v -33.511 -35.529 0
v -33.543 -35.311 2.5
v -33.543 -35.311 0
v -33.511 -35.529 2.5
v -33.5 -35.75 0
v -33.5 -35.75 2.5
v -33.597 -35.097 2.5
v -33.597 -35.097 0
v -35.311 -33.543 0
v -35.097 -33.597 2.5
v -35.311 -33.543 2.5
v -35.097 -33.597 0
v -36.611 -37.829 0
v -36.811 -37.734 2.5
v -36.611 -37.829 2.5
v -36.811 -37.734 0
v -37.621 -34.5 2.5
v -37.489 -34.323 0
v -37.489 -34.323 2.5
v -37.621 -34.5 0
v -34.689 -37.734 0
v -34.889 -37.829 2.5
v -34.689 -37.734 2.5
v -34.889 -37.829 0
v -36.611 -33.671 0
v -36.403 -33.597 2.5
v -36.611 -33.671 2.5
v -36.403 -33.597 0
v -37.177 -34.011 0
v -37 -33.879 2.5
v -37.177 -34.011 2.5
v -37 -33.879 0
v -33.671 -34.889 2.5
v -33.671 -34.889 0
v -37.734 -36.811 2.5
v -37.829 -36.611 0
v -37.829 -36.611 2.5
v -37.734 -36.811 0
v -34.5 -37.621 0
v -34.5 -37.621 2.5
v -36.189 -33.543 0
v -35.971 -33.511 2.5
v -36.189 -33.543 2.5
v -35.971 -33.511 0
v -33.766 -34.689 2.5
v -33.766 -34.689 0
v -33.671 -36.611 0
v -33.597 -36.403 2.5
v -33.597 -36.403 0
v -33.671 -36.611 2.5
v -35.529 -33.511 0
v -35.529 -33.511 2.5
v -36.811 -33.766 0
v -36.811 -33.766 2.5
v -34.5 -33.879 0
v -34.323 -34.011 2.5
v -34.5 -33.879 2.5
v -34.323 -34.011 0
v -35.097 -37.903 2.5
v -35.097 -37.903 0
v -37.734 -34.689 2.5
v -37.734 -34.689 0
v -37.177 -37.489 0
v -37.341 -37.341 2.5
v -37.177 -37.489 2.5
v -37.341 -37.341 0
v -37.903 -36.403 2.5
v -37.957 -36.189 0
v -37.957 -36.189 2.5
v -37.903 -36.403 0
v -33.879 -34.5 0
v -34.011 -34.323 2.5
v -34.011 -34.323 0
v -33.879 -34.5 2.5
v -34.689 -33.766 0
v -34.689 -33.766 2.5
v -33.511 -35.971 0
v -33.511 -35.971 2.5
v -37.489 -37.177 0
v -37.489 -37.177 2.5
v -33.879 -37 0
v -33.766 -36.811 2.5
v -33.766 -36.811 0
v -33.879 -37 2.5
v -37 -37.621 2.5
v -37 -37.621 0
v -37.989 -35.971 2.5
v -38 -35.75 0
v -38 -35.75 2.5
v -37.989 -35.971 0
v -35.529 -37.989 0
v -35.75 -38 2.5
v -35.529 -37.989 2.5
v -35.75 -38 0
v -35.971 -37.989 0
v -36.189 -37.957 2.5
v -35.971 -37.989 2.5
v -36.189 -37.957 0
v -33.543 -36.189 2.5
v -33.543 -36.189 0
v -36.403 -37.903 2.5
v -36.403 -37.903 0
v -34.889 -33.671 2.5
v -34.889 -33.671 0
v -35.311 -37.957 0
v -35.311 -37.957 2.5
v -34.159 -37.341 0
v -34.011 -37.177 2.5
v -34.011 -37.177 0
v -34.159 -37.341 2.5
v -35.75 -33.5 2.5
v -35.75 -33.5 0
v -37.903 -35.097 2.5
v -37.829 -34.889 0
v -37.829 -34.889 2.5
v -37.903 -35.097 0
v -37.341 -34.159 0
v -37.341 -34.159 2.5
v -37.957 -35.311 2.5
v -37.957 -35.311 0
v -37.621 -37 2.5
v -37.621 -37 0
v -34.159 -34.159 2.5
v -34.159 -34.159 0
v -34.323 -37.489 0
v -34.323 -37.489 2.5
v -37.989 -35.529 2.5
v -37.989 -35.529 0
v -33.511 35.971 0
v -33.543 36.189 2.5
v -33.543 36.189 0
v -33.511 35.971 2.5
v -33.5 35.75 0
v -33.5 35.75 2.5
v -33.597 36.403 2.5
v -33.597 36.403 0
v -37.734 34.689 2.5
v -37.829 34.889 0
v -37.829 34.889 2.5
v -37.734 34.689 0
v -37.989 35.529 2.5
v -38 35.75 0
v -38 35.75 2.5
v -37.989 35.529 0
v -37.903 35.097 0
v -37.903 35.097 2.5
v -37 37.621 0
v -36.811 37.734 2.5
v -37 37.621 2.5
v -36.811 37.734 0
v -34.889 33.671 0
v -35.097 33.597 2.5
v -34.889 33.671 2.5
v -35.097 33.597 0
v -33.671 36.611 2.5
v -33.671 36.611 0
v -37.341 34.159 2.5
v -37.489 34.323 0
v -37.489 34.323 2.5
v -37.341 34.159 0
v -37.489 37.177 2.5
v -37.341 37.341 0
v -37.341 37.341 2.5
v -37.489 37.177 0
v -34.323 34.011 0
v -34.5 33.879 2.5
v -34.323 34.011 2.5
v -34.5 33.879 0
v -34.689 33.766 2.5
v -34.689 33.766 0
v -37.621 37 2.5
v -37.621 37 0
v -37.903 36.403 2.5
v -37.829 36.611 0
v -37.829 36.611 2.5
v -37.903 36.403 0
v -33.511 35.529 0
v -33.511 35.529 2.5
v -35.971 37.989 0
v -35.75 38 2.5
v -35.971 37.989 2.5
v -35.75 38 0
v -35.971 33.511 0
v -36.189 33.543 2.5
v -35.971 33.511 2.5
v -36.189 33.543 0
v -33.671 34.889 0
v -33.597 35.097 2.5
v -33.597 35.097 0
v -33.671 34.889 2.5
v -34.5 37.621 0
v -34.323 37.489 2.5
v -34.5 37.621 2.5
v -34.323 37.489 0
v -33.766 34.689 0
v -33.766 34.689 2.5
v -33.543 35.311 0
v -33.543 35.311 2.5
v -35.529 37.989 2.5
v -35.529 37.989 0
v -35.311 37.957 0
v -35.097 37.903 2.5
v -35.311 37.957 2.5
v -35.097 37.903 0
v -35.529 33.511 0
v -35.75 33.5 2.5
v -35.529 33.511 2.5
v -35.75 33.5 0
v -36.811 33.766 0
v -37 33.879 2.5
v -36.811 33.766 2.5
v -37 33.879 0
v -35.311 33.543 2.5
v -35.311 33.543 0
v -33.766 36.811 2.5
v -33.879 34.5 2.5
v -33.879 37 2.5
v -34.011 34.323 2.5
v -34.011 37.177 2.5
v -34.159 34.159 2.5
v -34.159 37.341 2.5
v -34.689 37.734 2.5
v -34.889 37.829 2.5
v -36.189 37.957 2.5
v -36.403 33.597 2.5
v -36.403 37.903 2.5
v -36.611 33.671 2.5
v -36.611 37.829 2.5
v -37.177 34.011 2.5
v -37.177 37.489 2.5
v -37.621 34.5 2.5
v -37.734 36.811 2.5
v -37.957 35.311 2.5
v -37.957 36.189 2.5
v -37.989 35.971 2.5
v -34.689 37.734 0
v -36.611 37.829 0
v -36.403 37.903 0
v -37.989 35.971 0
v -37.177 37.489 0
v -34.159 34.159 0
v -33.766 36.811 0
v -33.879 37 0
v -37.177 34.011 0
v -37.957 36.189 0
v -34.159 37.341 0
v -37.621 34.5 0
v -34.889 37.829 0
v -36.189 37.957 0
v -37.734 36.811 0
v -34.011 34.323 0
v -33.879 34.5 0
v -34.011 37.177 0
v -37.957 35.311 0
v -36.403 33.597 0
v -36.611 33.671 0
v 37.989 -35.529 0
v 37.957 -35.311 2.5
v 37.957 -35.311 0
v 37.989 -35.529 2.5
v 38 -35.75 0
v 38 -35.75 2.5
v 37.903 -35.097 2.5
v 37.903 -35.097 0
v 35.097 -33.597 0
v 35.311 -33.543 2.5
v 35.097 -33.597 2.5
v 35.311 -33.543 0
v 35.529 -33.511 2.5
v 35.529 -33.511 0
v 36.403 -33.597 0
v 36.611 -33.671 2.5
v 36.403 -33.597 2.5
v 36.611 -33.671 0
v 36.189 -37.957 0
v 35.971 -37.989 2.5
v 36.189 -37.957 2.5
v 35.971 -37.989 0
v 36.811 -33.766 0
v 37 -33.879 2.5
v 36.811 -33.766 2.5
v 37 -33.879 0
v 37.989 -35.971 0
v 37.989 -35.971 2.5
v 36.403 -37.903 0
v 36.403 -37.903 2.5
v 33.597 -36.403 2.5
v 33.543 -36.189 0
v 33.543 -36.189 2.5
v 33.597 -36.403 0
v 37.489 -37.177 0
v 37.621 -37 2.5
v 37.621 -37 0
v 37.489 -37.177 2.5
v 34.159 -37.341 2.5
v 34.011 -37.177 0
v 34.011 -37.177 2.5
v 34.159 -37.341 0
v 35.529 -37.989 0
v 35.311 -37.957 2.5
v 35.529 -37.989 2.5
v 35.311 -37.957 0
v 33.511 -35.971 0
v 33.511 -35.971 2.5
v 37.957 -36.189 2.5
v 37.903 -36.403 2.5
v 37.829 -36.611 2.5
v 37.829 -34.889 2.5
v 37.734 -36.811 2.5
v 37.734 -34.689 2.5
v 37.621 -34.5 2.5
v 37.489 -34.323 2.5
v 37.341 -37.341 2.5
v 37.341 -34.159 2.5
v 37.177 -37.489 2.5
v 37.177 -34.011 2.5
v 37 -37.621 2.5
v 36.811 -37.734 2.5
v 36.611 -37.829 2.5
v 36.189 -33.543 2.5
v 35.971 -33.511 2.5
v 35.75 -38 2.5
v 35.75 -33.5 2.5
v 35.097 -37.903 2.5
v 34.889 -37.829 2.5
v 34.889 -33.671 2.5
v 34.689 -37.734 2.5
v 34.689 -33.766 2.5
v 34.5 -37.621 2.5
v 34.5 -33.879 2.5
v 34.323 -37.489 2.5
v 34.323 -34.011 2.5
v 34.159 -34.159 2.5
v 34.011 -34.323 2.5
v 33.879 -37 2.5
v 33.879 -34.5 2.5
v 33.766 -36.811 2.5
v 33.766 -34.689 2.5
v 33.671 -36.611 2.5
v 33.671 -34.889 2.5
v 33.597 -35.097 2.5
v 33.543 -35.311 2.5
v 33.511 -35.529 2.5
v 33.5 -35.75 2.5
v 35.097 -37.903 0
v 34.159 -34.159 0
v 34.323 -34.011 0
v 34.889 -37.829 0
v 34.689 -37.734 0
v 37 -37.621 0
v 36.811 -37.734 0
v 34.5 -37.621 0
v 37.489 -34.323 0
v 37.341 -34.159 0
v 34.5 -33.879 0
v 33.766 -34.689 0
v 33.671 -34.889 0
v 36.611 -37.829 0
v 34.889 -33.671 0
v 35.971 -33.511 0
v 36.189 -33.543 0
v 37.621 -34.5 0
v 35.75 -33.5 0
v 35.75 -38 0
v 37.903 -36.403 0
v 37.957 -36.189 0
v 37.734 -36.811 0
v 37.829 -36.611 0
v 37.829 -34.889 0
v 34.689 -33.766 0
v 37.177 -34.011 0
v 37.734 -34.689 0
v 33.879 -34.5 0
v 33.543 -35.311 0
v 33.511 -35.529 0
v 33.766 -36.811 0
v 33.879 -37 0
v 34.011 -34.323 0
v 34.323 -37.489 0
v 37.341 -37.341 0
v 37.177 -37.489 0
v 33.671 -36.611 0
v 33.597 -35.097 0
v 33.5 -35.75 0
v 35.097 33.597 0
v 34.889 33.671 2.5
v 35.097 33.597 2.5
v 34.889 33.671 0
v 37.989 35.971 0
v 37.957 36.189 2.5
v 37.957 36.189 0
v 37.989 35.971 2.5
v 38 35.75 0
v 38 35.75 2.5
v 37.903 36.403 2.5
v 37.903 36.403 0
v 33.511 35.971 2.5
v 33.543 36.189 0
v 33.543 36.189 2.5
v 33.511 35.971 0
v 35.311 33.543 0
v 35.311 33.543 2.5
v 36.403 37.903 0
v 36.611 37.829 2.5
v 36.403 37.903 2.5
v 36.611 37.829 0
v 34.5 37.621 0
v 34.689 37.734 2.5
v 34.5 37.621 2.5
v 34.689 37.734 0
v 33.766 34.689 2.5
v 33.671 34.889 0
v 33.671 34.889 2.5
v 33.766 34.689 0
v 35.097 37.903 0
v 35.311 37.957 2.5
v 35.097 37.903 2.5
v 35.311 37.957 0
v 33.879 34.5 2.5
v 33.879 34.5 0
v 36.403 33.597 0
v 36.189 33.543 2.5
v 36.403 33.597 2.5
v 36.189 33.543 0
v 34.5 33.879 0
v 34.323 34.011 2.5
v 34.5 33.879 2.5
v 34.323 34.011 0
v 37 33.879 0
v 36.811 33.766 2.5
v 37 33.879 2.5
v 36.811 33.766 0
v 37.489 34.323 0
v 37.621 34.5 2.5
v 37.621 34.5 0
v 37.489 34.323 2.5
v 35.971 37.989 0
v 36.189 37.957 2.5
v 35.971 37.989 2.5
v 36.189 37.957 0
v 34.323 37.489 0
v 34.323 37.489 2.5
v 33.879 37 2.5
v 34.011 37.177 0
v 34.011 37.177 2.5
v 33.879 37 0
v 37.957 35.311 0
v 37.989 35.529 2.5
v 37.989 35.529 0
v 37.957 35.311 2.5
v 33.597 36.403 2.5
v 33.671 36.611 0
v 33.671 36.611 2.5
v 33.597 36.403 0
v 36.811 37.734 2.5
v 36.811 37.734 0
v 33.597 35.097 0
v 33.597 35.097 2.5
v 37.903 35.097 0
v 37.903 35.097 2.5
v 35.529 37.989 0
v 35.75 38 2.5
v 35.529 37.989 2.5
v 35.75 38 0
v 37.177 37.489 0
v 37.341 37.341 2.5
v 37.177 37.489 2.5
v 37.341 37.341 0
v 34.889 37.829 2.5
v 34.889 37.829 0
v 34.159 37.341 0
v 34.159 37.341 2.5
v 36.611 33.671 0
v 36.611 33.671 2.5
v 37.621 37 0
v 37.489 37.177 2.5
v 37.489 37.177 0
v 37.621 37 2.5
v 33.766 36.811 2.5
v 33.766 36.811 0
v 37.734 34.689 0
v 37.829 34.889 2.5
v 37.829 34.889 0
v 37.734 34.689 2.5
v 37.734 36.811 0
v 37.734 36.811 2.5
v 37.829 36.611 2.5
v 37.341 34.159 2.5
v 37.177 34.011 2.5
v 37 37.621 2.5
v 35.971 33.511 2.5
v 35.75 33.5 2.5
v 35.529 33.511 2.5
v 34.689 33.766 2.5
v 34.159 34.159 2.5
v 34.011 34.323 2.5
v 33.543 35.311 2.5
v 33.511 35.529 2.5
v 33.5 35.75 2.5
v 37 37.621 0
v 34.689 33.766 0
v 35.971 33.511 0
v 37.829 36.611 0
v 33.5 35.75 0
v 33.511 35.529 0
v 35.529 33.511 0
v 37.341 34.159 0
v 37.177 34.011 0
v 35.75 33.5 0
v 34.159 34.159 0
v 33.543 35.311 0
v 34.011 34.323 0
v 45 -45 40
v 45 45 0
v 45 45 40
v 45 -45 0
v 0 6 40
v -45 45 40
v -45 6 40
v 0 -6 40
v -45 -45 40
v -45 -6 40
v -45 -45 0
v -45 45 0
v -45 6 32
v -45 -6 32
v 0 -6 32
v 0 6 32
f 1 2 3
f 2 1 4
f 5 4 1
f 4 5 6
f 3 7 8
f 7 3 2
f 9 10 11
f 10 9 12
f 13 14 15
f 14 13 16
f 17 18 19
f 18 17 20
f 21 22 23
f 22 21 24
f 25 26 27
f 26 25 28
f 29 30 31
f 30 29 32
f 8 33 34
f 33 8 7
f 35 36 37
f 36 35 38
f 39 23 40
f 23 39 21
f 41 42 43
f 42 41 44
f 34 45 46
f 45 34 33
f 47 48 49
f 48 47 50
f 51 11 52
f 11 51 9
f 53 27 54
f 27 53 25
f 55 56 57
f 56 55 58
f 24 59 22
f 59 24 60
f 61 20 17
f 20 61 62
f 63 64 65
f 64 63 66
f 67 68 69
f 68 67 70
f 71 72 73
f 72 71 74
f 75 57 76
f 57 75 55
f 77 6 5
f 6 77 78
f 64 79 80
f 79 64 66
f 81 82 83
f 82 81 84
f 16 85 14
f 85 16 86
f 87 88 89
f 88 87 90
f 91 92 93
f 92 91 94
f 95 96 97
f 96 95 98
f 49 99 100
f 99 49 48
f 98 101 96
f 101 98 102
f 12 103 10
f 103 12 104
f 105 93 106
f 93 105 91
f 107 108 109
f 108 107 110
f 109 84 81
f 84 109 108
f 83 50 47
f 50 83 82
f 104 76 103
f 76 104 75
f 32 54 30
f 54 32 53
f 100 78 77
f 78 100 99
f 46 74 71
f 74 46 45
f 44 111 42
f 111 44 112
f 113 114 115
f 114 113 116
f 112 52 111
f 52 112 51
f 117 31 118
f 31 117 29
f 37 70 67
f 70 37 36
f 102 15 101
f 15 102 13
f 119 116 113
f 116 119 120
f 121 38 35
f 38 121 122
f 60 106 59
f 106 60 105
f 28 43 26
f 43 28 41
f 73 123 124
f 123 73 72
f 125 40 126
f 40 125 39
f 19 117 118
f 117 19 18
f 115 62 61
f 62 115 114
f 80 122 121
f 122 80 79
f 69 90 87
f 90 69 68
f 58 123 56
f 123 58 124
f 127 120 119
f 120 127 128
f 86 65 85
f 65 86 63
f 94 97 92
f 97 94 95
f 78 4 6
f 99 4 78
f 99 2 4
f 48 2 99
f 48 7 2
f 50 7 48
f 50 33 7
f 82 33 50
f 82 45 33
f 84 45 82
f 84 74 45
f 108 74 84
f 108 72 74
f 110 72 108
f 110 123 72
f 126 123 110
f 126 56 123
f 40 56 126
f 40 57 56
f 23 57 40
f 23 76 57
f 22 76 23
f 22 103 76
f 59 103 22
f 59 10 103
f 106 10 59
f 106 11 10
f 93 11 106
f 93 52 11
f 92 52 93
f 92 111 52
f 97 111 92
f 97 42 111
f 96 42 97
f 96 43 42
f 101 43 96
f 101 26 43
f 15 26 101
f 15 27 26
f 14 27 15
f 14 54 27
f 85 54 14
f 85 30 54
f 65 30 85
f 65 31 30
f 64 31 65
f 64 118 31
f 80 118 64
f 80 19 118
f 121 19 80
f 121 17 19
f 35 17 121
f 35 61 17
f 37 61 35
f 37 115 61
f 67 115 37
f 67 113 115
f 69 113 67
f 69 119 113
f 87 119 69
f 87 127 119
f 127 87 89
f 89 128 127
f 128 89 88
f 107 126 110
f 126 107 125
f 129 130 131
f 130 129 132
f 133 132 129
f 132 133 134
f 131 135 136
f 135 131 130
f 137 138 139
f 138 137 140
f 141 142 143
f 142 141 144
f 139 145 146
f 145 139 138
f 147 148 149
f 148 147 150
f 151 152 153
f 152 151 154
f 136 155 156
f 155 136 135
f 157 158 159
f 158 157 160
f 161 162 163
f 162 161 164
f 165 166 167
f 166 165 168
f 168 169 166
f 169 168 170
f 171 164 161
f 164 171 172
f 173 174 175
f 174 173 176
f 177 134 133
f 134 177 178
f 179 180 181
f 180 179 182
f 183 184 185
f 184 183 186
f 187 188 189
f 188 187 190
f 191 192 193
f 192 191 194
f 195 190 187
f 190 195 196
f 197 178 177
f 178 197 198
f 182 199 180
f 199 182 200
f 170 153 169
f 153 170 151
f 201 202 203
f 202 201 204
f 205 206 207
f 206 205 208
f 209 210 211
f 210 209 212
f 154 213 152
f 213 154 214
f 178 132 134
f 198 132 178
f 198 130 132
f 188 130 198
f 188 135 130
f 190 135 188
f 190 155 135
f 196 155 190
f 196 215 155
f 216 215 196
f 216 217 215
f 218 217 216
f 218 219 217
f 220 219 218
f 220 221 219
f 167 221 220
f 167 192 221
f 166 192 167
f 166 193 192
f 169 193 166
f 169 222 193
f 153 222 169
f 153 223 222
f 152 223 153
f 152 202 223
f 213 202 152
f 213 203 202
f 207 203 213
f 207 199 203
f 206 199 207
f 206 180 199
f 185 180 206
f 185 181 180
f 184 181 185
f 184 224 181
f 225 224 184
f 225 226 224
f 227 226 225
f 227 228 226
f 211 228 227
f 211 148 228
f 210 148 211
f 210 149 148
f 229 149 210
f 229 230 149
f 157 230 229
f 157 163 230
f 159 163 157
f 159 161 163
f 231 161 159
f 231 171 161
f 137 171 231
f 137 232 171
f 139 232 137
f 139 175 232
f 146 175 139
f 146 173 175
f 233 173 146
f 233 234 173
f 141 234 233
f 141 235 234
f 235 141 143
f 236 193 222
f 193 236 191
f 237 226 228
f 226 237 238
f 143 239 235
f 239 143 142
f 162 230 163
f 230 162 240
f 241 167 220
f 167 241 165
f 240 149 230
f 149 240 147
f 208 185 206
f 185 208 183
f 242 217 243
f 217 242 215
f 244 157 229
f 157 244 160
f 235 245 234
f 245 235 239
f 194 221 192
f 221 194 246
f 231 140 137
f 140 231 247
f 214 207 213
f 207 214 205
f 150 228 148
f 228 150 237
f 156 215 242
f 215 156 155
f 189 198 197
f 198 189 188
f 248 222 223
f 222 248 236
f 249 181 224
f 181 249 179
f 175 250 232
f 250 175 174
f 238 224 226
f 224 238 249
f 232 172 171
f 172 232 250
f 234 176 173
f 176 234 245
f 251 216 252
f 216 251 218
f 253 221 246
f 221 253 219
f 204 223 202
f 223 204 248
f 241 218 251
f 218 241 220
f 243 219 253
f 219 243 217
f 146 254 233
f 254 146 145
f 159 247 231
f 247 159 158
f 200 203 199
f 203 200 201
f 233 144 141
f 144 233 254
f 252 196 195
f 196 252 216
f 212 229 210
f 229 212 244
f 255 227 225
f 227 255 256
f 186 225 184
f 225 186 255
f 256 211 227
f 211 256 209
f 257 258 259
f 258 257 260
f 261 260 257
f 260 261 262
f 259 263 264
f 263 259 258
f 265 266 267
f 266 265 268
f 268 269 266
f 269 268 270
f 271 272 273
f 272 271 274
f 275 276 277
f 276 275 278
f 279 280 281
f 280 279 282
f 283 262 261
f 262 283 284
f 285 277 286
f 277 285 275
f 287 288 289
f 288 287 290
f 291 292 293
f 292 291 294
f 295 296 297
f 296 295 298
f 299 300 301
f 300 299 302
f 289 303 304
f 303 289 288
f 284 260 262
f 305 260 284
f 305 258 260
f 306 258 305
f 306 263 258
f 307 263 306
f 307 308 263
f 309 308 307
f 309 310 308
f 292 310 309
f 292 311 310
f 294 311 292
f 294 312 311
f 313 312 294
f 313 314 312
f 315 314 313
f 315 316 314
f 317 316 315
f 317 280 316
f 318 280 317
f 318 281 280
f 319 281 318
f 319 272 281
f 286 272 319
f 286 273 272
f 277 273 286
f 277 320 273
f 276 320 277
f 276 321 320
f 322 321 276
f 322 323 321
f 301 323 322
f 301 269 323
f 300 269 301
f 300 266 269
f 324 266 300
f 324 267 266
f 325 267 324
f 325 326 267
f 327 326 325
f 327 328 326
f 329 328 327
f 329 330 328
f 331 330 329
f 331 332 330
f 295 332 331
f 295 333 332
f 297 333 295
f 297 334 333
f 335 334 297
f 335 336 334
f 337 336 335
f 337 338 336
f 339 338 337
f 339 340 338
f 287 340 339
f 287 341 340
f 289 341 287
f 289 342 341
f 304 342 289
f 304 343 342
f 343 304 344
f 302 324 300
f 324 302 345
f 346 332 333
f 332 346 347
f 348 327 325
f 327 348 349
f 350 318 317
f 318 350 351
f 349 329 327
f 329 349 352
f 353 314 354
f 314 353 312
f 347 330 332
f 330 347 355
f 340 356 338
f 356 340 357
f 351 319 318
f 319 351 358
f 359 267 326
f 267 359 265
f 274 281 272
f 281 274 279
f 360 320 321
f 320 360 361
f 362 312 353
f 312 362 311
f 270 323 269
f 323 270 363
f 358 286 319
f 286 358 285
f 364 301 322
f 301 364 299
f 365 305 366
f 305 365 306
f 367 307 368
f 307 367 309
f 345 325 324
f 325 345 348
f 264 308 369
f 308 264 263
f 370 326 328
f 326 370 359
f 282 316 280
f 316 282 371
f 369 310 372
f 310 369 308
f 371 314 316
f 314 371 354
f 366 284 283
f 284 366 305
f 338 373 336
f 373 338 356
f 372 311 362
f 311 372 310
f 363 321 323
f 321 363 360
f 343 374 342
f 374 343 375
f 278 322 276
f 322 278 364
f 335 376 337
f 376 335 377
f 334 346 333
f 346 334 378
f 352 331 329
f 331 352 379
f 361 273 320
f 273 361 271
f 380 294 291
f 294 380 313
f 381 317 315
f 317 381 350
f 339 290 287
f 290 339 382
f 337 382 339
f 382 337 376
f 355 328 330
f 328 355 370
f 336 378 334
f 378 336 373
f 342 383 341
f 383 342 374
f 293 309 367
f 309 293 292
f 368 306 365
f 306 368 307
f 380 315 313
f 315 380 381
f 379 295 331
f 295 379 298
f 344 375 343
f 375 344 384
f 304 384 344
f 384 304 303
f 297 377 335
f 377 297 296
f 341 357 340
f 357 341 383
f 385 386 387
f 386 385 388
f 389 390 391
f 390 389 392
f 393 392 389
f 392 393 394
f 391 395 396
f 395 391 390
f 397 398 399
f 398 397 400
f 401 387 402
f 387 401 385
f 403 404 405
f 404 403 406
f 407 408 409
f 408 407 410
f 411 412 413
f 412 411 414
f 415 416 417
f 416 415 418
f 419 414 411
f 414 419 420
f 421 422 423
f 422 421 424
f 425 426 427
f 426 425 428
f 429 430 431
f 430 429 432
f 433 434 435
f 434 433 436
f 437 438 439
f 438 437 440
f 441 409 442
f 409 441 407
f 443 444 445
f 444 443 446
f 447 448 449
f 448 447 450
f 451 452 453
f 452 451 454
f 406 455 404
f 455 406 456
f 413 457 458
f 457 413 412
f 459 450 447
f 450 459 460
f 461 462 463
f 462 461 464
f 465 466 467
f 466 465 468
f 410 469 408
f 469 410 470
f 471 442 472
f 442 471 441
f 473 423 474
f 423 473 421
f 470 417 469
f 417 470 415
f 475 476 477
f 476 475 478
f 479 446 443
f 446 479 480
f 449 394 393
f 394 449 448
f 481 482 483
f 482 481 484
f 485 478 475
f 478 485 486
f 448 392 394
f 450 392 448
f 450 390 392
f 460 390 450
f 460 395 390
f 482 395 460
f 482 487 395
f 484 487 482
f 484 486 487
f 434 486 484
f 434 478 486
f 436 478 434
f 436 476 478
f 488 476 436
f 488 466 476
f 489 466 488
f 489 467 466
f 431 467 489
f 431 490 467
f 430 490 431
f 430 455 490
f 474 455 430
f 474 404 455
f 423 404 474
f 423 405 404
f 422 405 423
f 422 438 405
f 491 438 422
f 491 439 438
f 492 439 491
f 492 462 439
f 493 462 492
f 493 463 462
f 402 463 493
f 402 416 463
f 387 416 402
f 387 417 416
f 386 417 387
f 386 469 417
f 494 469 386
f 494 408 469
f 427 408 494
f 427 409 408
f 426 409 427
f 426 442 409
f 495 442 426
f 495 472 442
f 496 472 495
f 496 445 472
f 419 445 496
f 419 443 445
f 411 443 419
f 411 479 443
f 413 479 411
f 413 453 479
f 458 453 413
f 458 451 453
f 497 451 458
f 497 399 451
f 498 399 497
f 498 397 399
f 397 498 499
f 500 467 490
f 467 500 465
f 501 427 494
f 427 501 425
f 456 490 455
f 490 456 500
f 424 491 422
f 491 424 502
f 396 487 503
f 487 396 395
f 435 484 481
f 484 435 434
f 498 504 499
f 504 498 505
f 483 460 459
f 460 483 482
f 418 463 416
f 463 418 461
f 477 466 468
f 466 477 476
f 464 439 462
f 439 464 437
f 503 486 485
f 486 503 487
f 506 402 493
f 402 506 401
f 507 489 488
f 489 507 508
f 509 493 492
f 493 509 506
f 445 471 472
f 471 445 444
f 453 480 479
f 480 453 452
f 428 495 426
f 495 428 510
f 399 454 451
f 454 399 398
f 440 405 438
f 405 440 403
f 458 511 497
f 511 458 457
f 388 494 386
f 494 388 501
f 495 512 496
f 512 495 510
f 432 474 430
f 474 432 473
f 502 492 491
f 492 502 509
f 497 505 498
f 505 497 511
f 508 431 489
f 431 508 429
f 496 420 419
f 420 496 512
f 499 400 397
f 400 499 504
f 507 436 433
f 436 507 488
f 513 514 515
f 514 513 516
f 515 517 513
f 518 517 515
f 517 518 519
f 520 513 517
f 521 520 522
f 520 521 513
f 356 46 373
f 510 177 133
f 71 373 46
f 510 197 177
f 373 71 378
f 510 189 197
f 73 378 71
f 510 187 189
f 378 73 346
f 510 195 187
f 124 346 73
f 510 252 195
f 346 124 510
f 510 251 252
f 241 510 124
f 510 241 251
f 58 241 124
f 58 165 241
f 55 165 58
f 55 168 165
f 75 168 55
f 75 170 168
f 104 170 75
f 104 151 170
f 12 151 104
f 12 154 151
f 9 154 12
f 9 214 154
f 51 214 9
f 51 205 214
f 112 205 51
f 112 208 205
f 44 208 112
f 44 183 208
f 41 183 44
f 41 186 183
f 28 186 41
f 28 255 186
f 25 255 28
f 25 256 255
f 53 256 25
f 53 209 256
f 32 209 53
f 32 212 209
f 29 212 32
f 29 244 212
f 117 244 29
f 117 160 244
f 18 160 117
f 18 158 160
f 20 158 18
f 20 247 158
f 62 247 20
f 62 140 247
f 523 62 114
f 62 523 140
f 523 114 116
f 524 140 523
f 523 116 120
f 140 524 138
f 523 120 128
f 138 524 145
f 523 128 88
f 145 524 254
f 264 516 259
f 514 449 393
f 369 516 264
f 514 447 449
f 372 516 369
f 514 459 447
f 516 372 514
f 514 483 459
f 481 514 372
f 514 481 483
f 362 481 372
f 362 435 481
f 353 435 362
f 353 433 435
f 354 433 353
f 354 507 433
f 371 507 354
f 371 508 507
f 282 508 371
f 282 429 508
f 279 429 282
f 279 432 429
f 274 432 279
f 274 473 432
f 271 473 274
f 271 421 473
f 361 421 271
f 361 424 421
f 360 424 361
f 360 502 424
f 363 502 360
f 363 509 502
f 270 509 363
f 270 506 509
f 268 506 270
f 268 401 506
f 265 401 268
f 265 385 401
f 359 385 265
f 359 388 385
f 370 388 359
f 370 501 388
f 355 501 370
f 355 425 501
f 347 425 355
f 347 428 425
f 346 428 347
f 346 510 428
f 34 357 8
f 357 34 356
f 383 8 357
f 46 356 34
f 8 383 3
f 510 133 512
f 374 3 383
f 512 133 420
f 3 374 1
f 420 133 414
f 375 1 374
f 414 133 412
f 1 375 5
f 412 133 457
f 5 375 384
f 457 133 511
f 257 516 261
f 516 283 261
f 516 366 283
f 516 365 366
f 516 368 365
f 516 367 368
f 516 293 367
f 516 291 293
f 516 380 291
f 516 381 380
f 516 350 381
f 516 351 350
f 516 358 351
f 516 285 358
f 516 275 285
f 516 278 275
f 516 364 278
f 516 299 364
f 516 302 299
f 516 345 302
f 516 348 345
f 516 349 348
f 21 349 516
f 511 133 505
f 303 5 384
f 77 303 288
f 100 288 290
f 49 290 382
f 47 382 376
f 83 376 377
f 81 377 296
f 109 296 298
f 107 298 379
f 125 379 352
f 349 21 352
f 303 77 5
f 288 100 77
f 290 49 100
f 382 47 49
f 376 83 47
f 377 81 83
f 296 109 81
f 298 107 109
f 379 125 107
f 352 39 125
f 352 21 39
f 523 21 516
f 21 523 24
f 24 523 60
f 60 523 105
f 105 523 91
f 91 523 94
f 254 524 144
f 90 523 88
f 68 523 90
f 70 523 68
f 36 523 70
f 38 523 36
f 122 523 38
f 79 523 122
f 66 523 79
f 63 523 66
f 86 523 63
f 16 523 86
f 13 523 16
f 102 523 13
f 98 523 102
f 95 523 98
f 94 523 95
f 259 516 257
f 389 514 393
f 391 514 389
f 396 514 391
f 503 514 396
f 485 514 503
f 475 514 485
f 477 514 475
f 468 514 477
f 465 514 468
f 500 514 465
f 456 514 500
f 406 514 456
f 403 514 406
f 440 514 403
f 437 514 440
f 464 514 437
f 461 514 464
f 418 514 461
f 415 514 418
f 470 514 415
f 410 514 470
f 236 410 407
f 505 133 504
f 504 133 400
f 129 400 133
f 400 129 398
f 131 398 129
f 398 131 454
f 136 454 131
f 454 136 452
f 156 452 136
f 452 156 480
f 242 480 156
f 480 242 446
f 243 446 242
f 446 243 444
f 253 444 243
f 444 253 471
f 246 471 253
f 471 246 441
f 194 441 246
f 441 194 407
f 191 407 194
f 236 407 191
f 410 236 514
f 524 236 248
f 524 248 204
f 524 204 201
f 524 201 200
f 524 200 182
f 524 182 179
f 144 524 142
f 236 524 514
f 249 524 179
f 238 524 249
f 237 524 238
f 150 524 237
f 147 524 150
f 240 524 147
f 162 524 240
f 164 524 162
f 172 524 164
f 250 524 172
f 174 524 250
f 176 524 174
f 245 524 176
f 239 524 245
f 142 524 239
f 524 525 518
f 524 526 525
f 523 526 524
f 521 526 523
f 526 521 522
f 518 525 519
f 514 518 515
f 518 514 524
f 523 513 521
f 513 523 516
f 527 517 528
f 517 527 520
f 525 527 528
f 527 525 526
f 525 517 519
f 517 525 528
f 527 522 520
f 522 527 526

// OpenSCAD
// Magnetic stirrer housing (upside-down open box) for an 80 mm PC case fan
// Print orientation: top plate on the bed (z = 0), walls rise to z = 40

// ---------- Parameters ----------
plate_t      = 2;     // top plate thickness
wall_t       = 2.5;   // wall thickness
open_top_z   = 40;    // height of the open top
outer_size   = 90;    // outer size in X and Y
hole_d       = 4.5;   // M4 screw hole diameter
hole_pitch   = 71.5;  // square pattern size for the holes
notch_w      = 12;    // cable notch width
notch_bottom = 32;    // notch depth (from open edge down to this z)
eps          = 0.5;   // cutter overshoot past faces

$fn = 64;

// ---------- Model ----------
difference() {
    // Solid block
    translate([-outer_size/2, -outer_size/2, 0])
        cube([outer_size, outer_size, open_top_z]);

    // Screw holes through the top plate
    for (x = [-hole_pitch/2, hole_pitch/2])
        for (y = [-hole_pitch/2, hole_pitch/2])
            translate([x, y, -eps])
                cylinder(d = hole_d, h = plate_t + 2*eps);

    // Cable notch in one wall (along Y, centred)
    translate([-outer_size/2, -notch_w/2, notch_bottom])
        cube([outer_size/2, notch_w, open_top_z - notch_bottom + eps]);
}
